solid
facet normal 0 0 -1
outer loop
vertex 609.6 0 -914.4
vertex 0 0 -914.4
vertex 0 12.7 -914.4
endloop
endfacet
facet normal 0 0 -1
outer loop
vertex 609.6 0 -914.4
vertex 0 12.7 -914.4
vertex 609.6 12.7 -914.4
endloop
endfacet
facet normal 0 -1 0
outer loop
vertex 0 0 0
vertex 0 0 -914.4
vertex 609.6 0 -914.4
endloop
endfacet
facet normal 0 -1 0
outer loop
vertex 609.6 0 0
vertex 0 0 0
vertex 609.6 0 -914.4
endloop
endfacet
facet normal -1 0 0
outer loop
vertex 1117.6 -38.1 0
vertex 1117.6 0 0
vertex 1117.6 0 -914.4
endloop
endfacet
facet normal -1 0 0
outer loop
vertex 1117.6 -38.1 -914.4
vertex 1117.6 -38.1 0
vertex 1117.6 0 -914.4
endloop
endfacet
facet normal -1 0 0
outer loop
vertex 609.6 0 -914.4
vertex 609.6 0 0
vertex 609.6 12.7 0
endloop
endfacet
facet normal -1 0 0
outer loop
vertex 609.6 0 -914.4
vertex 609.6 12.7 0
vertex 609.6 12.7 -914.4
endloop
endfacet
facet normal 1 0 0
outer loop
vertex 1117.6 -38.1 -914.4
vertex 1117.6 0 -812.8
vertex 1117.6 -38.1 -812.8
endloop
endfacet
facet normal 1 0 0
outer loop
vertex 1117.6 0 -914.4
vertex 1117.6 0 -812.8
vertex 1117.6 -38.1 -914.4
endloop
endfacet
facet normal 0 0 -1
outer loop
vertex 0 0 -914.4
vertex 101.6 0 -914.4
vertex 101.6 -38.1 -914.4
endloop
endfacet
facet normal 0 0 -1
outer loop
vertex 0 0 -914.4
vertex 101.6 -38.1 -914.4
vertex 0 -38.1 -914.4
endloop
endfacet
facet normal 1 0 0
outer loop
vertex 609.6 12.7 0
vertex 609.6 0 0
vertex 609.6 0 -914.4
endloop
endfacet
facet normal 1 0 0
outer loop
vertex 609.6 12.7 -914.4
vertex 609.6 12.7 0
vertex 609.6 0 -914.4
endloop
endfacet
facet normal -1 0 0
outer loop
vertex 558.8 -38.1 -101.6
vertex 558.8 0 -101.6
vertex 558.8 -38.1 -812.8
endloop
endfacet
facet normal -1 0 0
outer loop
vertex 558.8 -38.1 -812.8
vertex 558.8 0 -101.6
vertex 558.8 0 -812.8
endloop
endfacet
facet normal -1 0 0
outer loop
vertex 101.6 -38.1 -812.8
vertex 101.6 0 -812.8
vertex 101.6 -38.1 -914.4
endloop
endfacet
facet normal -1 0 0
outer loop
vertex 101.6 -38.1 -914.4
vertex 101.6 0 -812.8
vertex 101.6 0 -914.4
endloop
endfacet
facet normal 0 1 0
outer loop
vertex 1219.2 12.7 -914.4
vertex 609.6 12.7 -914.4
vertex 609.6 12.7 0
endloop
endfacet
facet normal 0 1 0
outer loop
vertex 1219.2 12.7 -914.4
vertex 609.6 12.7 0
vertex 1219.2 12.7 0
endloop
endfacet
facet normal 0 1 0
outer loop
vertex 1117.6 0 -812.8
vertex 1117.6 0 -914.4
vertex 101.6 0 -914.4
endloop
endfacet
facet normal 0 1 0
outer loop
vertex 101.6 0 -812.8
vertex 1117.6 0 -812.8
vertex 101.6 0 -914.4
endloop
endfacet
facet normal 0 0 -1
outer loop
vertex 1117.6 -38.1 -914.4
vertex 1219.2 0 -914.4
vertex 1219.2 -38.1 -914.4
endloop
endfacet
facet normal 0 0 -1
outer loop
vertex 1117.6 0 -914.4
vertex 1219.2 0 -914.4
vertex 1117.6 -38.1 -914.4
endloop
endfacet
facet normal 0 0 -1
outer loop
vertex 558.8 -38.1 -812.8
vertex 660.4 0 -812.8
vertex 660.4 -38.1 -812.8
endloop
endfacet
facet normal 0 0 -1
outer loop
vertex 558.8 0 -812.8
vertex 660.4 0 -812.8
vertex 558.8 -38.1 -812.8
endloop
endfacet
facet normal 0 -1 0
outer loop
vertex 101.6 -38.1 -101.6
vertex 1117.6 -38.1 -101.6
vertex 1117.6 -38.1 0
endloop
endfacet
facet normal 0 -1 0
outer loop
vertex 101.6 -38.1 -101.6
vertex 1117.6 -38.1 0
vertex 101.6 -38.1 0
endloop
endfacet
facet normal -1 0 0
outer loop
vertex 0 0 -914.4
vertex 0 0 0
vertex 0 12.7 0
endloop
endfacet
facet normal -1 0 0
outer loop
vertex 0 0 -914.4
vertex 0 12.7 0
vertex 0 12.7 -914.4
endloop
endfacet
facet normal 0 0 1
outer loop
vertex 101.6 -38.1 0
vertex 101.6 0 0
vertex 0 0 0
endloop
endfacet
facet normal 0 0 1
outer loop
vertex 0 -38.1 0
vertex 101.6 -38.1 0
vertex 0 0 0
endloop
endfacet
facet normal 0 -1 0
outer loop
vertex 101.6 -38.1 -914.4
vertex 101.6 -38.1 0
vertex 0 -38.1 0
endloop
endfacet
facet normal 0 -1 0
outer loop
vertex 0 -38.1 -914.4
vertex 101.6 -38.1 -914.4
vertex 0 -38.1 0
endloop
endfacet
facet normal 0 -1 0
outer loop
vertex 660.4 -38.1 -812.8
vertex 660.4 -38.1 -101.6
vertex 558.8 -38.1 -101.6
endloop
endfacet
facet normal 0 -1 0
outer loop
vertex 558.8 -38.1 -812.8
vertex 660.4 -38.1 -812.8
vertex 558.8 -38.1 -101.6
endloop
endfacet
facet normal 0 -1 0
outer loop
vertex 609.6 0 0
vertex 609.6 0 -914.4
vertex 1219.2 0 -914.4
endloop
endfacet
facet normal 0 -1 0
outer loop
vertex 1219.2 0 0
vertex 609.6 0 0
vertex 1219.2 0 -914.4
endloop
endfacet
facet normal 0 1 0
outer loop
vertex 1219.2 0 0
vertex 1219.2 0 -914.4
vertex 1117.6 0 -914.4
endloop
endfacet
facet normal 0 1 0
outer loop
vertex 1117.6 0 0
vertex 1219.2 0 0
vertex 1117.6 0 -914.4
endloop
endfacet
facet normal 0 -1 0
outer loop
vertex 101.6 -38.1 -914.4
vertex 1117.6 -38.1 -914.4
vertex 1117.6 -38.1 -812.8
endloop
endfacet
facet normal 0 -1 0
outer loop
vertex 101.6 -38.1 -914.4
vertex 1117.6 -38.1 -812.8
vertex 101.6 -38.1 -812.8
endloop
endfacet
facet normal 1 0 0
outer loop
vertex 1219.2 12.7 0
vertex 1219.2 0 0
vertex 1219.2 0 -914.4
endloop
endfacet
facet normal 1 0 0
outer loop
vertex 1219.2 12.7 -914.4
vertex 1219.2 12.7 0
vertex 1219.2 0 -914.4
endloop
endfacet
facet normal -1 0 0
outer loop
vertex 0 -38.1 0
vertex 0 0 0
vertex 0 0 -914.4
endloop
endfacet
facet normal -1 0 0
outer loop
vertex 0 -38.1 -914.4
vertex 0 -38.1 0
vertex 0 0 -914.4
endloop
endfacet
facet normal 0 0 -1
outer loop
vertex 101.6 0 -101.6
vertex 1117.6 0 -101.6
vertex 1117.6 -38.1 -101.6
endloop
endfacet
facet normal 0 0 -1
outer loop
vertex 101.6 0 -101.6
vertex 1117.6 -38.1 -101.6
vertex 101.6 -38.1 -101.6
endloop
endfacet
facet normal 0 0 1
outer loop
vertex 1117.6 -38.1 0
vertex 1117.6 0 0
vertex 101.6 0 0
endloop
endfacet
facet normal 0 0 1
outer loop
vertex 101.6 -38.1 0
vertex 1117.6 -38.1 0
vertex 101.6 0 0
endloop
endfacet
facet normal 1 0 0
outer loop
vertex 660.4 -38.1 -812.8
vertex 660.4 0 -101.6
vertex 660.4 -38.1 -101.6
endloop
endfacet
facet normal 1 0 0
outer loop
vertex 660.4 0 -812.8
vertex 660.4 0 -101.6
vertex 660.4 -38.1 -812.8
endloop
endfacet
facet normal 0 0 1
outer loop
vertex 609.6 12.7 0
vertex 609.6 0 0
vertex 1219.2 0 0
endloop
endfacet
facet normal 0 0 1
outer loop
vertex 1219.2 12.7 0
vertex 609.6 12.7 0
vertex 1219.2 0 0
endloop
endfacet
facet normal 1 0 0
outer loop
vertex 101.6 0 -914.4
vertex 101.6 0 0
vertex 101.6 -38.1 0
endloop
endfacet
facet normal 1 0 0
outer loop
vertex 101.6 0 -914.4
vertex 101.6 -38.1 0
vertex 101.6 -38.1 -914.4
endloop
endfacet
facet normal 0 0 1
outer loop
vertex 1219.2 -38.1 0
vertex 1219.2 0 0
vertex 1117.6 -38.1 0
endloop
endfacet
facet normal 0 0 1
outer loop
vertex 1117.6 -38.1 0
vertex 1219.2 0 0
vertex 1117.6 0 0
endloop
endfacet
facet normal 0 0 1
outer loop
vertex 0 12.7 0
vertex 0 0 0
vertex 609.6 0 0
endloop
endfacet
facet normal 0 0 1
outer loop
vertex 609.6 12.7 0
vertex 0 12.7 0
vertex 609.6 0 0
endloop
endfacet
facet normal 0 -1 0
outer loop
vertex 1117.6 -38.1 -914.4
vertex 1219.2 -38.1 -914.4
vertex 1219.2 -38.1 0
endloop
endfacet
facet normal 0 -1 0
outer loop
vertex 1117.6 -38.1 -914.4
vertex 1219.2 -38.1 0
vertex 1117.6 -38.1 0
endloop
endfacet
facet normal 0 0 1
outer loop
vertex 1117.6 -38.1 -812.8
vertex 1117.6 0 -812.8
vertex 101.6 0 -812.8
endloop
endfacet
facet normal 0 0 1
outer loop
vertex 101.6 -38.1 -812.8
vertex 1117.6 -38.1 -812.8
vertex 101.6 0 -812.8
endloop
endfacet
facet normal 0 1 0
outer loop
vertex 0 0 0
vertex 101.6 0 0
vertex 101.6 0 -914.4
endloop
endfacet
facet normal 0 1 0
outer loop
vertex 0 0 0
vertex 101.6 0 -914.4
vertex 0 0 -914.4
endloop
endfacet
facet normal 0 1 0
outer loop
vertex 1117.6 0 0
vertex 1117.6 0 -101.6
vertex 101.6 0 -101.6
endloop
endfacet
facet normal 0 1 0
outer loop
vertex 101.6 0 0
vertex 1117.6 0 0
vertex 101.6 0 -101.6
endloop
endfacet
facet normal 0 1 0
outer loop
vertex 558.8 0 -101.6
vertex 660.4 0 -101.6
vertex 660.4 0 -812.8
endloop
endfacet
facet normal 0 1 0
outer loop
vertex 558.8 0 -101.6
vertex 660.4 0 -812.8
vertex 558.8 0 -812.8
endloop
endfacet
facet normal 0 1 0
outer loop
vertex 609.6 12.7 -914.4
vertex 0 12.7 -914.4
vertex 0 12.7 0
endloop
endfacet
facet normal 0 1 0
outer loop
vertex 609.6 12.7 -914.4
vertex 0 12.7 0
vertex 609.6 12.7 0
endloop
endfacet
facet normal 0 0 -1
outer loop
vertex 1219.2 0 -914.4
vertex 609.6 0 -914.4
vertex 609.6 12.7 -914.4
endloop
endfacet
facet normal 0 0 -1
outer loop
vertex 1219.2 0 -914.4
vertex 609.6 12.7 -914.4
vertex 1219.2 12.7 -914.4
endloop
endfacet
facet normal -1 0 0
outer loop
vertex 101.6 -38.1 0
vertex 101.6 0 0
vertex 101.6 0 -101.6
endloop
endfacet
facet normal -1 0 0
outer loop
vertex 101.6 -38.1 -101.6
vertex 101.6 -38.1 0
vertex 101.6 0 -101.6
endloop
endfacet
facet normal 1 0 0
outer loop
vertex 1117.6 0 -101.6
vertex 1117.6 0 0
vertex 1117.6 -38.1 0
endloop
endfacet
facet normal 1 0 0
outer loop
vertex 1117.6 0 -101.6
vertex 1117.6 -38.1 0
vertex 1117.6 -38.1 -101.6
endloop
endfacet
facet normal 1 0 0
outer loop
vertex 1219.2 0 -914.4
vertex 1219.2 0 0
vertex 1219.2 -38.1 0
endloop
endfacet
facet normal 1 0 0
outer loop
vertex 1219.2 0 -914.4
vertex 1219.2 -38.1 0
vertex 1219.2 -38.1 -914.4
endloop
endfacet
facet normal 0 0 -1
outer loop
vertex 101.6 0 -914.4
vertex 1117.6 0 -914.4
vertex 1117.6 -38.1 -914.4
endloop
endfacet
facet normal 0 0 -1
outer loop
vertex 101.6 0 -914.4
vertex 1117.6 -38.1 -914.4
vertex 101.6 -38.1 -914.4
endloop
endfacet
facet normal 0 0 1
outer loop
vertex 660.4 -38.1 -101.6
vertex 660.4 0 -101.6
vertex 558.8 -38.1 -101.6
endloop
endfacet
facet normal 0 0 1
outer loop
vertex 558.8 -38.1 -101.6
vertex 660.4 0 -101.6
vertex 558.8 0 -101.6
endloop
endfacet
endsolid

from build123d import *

# Parameters (mm, degrees)
SKETCH1_W           = 609.6
SKETCH1_H           = 914.4
BOSS_EXTRUDE1_DEPTH = 12.7
SKETCH2_W           = 609.6
SKETCH2_H           = 914.4
BOSS_EXTRUDE2_DEPTH = 12.7
SKETCH3_W           = 101.6
SKETCH3_H           = 914.4
BOSS_EXTRUDE4_DEPTH = 38.1
SKETCH5_W           = 101.6
SKETCH5_H           = 914.4
BOSS_EXTRUDE5_DEPTH = 38.1
SKETCH7_W           = 1016
SKETCH7_H           = 101.6
BOSS_EXTRUDE6_DEPTH = 38.1
SKETCH6_W           = 1016
SKETCH6_H           = 101.6
BOSS_EXTRUDE7_DEPTH = 38.1
SKETCH8_W           = 101.6
SKETCH8_H           = 711.2
BOSS_EXTRUDE8_DEPTH = 38.1


with BuildPart() as part:
    # Sketch1 → Boss-Extrude1 (new body)
    with BuildSketch(Plane(origin=(0, 0, 0), x_dir=(1, 0, 0), z_dir=(0, 1, 0))):
        with Locations((304.8, 457.2)):
            Rectangle(SKETCH1_W, SKETCH1_H)
    extrude(amount=BOSS_EXTRUDE1_DEPTH)


with BuildPart() as body_2:
    # Sketch2 → Boss-Extrude2 (new body)
    with BuildSketch(Plane(origin=(0, 0, 0), x_dir=(1, 0, 0), z_dir=(0, 1, 0))):
        with Locations((914.4, 457.2)):
            Rectangle(SKETCH2_W, SKETCH2_H)
    extrude(amount=BOSS_EXTRUDE2_DEPTH)


with BuildPart() as body_3:
    # Sketch3 → Boss-Extrude4 (new body)
    with BuildSketch(Plane(origin=(0, 0, 0), x_dir=(-1, 0, 0), z_dir=(0, -1, 0))):
        with Locations((-1168.4, 457.2)):
            Rectangle(SKETCH3_W, SKETCH3_H)
    extrude(amount=BOSS_EXTRUDE4_DEPTH)


with BuildPart() as body_4:
    # Sketch5 → Boss-Extrude5 (new body)
    with BuildSketch(Plane(origin=(0, 0, 0), x_dir=(-1, 0, 0), z_dir=(0, -1, 0))):
        with Locations((-50.8, 457.2)):
            Rectangle(SKETCH5_W, SKETCH5_H)
    extrude(amount=BOSS_EXTRUDE5_DEPTH)


with BuildPart() as body_5:
    # Sketch7 → Boss-Extrude6 (new body)
    with BuildSketch(Plane(origin=(0, 0, 0), x_dir=(-1, 0, 0), z_dir=(0, -1, 0))):
        with Locations((-609.6, 50.8)):
            Rectangle(SKETCH7_W, SKETCH7_H)
    extrude(amount=BOSS_EXTRUDE6_DEPTH)


with BuildPart() as body_6:
    # Sketch6 → Boss-Extrude7 (new body)
    with BuildSketch(Plane(origin=(0, 0, 0), x_dir=(-1, 0, 0), z_dir=(0, -1, 0))):
        with Locations((-609.6, 863.6)):
            Rectangle(SKETCH6_W, SKETCH6_H)
    extrude(amount=BOSS_EXTRUDE7_DEPTH)


with BuildPart() as body_7:
    # Sketch8 → Boss-Extrude8 (new body)
    with BuildSketch(Plane(origin=(0, 0, 0), x_dir=(-1, 0, 0), z_dir=(0, -1, 0))):
        with Locations((-609.6, 457.2)):
            Rectangle(SKETCH8_W, SKETCH8_H)
    extrude(amount=BOSS_EXTRUDE8_DEPTH)


solid = Compound([part.part, body_2.part, body_3.part, body_4.part, body_5.part, body_6.part, body_7.part])
